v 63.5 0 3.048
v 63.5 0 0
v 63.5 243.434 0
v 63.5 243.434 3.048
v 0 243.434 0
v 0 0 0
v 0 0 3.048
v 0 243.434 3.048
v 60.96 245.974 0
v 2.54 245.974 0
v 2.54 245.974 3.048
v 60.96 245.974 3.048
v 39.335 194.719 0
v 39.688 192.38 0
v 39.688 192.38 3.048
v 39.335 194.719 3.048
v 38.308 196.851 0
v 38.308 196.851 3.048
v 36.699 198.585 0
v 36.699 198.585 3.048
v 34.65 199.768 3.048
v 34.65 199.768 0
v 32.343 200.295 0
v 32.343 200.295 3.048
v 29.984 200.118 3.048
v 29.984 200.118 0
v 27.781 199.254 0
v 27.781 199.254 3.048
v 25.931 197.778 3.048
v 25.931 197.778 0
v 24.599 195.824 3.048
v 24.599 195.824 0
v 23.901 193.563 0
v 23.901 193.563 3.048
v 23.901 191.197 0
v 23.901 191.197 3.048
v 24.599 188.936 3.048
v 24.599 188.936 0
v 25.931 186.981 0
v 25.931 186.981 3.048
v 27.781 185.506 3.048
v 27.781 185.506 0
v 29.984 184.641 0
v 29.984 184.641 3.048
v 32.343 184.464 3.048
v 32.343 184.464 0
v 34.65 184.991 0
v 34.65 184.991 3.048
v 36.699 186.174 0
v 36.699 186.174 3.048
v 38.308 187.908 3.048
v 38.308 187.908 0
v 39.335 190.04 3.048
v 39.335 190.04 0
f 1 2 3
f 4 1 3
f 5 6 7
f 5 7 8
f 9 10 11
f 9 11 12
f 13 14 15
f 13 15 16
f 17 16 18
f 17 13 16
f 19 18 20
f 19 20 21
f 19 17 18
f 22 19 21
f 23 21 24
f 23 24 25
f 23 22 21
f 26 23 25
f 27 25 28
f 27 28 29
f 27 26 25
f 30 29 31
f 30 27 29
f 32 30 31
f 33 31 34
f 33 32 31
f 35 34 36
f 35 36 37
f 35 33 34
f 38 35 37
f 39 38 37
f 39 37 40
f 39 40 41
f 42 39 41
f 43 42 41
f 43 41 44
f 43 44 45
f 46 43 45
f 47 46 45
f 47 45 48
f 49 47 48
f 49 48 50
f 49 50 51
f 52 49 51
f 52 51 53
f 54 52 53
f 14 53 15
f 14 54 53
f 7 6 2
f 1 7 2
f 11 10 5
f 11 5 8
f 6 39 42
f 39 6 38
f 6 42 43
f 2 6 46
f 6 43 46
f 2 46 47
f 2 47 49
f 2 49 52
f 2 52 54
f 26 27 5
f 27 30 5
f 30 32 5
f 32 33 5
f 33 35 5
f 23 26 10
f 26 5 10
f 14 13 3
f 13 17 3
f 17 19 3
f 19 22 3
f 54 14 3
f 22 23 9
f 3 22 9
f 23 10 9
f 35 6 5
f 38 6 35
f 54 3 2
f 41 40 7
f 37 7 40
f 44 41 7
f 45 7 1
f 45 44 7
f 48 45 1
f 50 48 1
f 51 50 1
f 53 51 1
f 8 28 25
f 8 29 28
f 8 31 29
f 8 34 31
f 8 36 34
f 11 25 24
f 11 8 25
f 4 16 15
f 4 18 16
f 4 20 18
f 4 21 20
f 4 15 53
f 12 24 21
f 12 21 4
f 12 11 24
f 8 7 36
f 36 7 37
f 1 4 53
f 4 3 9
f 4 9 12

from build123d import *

# Parameters (mm, degrees)
SKETCH1_W           = 63.5
SKETCH1_H           = 245.9736
SKETCH1_R           = 7.9375
BOSS_EXTRUDE1_DEPTH = 3.048
CHAMFER1_SIZE       = 2.54


with BuildPart() as part:
    # Sketch1 → Boss-Extrude1 (new body)
    with BuildSketch(Plane.XY):
        with Locations((31.75, 122.9868)):
            Rectangle(SKETCH1_W, SKETCH1_H)
        with Locations((31.75, 192.3796)):
            Circle(SKETCH1_R, mode=Mode.SUBTRACT)
    extrude(amount=BOSS_EXTRUDE1_DEPTH)

    # Chamfer1
    chamfer1_edges = [part.edges().sort_by_distance(p)[0] for p in [
        (0, 245.9736, 1.524),
        (63.5, 245.9736, 1.524),
    ]]
    chamfer(chamfer1_edges, length=CHAMFER1_SIZE)


solid = part.part
